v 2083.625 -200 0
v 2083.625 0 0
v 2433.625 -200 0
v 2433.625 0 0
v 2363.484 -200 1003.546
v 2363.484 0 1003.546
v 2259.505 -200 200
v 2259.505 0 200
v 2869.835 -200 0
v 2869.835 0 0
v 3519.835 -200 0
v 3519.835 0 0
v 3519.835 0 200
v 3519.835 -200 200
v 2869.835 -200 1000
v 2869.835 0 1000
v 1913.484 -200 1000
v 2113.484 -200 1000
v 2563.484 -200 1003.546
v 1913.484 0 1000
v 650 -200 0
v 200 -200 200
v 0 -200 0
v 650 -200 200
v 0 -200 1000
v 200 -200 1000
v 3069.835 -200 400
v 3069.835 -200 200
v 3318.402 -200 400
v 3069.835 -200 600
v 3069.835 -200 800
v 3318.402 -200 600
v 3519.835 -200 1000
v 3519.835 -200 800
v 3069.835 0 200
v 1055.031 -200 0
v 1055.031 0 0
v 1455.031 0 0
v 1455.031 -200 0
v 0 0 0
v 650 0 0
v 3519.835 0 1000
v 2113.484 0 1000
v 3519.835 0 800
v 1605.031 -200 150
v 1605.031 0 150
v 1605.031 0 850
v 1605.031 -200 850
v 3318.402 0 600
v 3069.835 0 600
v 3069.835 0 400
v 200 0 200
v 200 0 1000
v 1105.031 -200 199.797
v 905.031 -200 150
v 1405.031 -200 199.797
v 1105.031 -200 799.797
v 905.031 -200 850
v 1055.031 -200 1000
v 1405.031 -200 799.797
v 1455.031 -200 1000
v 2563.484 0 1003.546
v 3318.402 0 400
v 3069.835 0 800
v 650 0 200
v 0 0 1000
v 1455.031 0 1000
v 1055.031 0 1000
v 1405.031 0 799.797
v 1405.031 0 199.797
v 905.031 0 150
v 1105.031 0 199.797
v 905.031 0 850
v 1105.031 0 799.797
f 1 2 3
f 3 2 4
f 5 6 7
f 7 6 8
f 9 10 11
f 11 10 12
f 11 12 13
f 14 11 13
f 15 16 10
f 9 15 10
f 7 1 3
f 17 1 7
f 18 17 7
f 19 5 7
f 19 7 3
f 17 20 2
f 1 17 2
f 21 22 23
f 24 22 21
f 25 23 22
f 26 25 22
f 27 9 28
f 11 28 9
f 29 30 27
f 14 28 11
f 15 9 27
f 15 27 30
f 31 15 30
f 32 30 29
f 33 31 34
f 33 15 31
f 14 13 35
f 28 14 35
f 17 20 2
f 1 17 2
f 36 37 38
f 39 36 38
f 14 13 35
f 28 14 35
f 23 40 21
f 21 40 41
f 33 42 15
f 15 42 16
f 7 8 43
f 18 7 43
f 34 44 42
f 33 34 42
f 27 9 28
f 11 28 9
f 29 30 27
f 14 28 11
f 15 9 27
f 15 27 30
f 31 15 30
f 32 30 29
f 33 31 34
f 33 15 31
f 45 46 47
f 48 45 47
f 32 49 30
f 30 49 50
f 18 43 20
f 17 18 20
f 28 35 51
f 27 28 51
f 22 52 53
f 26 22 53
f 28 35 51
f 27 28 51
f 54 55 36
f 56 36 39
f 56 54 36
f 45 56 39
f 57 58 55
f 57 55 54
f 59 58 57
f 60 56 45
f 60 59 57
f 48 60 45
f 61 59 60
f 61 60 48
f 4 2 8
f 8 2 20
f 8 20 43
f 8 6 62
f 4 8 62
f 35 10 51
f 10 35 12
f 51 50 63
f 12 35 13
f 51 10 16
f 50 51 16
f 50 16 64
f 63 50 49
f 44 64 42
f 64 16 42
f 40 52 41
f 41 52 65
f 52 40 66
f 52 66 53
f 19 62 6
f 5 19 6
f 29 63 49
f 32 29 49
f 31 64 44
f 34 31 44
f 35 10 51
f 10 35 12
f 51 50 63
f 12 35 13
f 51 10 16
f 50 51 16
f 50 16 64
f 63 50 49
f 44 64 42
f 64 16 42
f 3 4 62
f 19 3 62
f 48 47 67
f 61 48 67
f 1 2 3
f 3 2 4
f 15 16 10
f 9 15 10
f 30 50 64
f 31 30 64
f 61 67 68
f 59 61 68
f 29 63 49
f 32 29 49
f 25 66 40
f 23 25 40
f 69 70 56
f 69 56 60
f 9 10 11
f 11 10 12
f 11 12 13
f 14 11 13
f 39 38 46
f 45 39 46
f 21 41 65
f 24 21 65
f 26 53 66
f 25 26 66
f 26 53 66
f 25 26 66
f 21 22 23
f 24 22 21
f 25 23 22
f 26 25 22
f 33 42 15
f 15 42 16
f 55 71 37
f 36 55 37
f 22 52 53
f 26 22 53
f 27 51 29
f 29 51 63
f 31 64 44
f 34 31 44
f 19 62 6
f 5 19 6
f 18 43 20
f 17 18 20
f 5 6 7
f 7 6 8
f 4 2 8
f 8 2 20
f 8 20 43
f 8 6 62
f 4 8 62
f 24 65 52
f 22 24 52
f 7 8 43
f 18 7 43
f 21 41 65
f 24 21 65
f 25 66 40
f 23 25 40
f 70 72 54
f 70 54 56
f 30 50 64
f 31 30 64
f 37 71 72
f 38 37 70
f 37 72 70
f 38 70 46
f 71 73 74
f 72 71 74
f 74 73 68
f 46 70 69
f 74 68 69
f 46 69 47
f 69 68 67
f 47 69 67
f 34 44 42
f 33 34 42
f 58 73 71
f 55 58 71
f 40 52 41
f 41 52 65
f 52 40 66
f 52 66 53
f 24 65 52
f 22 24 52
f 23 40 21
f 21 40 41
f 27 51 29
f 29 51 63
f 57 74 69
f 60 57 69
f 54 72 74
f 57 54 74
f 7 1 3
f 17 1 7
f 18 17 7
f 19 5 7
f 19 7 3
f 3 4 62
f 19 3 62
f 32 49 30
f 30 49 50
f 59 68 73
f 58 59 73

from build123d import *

# Parameters (mm, degrees)
F1_DEPTH = 200
F0_W     = 300
F0_H     = 600
F2_DEPTH = 200


with BuildPart() as f1:
    # F0 (on Front) → F1 (new body)
    with BuildSketch(Plane.XZ):
        Polygon((0, 1000), (0, 0), (650, 0), (650, 200), (200, 200), (200, 1000), align=None)
        Polygon((2113.484427, 1000), (1913.484427, 1000), (2083.625296, 0), (2433.625296, 0), (2563.484427, 1003.546355), (2363.484427, 1003.546355), (2259.505342, 200), align=None)
        Polygon((3519.834609, 1000), (2869.834609, 1000), (2869.834609, 0), (3519.834609, 0), (3519.834609, 200), (3069.834609, 200), (3069.834609, 400), (3318.40156, 400), (3318.40156, 600), (3069.834609, 600), (3069.834609, 800), (3519.834609, 800), align=None)
    extrude(amount=F1_DEPTH)


with BuildPart() as f2:
    # F0 (on Front) → F2 (new body)
    with BuildSketch(Plane.XZ):
        Polygon((0, 1000), (0, 0), (650, 0), (650, 200), (200, 200), (200, 1000), align=None)
        Polygon((905.03087, 150), (1055.03087, 0), (1455.03087, 0), (1605.03087, 150), (1605.03087, 850), (1455.03087, 1000), (1055.03087, 1000), (905.03087, 850), align=None)
        with Locations((1255.03087, 499.796687)):
            Rectangle(F0_W, F0_H, mode=Mode.SUBTRACT)
        Polygon((2113.484427, 1000), (1913.484427, 1000), (2083.625296, 0), (2433.625296, 0), (2563.484427, 1003.546355), (2363.484427, 1003.546355), (2259.505342, 200), align=None)
        Polygon((3519.834609, 1000), (2869.834609, 1000), (2869.834609, 0), (3519.834609, 0), (3519.834609, 200), (3069.834609, 200), (3069.834609, 400), (3318.40156, 400), (3318.40156, 600), (3069.834609, 600), (3069.834609, 800), (3519.834609, 800), align=None)
    extrude(amount=F2_DEPTH)


solid = Compound([f1.part, f2.part])
